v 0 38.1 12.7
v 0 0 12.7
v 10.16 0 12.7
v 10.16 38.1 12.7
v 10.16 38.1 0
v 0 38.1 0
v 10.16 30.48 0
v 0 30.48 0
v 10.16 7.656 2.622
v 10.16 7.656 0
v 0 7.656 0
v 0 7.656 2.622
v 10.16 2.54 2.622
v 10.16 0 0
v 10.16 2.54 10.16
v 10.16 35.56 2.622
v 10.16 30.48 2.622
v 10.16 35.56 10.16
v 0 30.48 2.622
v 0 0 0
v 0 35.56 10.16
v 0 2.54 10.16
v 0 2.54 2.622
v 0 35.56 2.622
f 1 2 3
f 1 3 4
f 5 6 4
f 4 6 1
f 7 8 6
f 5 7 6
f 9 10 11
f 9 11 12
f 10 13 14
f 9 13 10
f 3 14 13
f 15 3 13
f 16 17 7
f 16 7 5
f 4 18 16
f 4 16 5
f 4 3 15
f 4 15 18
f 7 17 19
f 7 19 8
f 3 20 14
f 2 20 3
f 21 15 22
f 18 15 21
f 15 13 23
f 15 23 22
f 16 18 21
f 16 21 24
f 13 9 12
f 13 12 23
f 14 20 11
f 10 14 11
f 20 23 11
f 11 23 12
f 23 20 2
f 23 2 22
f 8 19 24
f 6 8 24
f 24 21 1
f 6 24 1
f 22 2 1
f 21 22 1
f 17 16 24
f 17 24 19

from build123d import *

# Parameters (mm, degrees)
SKETCH1_W           = 38.1
SKETCH1_H           = 12.7
BOSS_EXTRUDE1_DEPTH = 10.16
CUT_EXTRUDE1_DEPTH  = 10.16


with BuildPart() as part:
    # Sketch1 → Boss-Extrude1 (new body)
    with BuildSketch(Plane.YZ):
        with Locations((19.05, 6.35)):
            Rectangle(SKETCH1_W, SKETCH1_H)
    extrude(amount=BOSS_EXTRUDE1_DEPTH)

    # Sketch2 → Cut-Extrude1 (cut)
    with BuildSketch(Plane.YZ.offset(10.16)):
        Polygon((2.54, 10.16), (35.56, 10.16), (35.56, 2.621943929), (30.48, 2.621943929), (30.48, 0), (7.656390435, 0), (7.656390435, 2.621943929), (2.54, 2.621943929), align=None)
    extrude(amount=-CUT_EXTRUDE1_DEPTH, mode=Mode.SUBTRACT)


solid = part.part
